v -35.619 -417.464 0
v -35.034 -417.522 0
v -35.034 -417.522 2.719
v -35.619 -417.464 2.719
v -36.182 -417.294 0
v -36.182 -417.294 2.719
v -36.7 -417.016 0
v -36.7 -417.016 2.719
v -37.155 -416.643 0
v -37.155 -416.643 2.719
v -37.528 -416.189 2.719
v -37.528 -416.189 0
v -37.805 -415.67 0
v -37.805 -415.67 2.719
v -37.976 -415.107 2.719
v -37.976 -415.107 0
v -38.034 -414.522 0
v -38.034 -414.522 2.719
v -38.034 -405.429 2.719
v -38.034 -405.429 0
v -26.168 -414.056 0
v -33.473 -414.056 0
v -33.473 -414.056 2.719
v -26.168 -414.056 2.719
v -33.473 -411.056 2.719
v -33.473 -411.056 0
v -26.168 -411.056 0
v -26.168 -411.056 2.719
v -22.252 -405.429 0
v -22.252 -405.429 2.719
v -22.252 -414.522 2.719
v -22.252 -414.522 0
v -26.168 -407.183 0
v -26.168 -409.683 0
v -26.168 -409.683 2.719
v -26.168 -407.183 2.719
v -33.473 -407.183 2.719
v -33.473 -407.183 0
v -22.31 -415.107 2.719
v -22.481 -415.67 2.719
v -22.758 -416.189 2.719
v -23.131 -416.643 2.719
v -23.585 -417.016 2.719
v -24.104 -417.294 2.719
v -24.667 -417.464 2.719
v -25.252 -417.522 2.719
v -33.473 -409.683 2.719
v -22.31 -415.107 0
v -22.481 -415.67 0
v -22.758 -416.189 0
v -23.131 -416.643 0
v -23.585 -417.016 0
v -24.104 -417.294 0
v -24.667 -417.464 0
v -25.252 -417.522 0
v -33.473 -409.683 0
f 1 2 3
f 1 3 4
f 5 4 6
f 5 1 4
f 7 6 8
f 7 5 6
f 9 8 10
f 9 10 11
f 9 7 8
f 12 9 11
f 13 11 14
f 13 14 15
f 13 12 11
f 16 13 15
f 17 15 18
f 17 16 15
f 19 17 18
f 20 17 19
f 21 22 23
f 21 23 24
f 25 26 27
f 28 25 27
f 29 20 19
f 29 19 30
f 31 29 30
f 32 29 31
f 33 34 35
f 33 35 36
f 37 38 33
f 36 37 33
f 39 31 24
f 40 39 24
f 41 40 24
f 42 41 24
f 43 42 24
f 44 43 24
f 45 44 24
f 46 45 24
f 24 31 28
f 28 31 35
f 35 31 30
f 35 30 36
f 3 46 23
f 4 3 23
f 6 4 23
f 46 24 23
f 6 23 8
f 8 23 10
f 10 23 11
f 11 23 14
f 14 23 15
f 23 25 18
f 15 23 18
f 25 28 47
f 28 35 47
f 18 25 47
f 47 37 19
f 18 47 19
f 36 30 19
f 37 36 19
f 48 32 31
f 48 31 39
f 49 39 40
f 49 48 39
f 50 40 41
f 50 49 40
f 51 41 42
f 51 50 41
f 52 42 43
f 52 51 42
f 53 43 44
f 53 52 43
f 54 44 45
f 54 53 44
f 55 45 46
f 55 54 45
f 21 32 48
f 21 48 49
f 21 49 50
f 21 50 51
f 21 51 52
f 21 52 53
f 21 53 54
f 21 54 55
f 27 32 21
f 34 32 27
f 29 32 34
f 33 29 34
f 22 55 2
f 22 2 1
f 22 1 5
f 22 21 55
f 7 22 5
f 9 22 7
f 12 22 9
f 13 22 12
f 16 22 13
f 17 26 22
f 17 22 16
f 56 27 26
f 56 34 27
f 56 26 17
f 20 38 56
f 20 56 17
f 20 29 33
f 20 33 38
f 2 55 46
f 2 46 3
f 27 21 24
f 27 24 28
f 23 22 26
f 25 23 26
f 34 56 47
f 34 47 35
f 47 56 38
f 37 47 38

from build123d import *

# Parameters (mm, degrees)
SKETCH1_W           = 7.305190172
SKETCH1_H           = 3
SKETCH1_H_2         = 2.5
BOSS_EXTRUDE1_DEPTH = 2.719448


with BuildPart() as part:
    # Sketch1 → Boss-Extrude1 (new body)
    with BuildSketch(Plane.XY):
        with BuildLine():
            Line((-25.252187622, -417.522040931), (-35.0337538, -417.522040931))
            ThreePointArc((-35.0337538, -417.522040931), (-37.155074144, -416.643361274), (-38.0337538, -414.522040931))
            Line((-38.0337538, -414.522040931), (-38.0337538, -405.428571358))
            Line((-38.0337538, -405.428571358), (-22.252187622, -405.428571358))
            Line((-22.252187622, -405.428571358), (-22.252187622, -414.522040931))
            ThreePointArc((-22.252187622, -414.522040931), (-23.130867278, -416.643361274), (-25.252187622, -417.522040931))
        make_face()
        with Locations((-29.82012001, -412.555740742)):
            Rectangle(SKETCH1_W, SKETCH1_H, mode=Mode.SUBTRACT)
        with Locations((-29.82012001, -408.432910126)):
            Rectangle(SKETCH1_W, SKETCH1_H_2, mode=Mode.SUBTRACT)
    extrude(amount=BOSS_EXTRUDE1_DEPTH)


solid = part.part
